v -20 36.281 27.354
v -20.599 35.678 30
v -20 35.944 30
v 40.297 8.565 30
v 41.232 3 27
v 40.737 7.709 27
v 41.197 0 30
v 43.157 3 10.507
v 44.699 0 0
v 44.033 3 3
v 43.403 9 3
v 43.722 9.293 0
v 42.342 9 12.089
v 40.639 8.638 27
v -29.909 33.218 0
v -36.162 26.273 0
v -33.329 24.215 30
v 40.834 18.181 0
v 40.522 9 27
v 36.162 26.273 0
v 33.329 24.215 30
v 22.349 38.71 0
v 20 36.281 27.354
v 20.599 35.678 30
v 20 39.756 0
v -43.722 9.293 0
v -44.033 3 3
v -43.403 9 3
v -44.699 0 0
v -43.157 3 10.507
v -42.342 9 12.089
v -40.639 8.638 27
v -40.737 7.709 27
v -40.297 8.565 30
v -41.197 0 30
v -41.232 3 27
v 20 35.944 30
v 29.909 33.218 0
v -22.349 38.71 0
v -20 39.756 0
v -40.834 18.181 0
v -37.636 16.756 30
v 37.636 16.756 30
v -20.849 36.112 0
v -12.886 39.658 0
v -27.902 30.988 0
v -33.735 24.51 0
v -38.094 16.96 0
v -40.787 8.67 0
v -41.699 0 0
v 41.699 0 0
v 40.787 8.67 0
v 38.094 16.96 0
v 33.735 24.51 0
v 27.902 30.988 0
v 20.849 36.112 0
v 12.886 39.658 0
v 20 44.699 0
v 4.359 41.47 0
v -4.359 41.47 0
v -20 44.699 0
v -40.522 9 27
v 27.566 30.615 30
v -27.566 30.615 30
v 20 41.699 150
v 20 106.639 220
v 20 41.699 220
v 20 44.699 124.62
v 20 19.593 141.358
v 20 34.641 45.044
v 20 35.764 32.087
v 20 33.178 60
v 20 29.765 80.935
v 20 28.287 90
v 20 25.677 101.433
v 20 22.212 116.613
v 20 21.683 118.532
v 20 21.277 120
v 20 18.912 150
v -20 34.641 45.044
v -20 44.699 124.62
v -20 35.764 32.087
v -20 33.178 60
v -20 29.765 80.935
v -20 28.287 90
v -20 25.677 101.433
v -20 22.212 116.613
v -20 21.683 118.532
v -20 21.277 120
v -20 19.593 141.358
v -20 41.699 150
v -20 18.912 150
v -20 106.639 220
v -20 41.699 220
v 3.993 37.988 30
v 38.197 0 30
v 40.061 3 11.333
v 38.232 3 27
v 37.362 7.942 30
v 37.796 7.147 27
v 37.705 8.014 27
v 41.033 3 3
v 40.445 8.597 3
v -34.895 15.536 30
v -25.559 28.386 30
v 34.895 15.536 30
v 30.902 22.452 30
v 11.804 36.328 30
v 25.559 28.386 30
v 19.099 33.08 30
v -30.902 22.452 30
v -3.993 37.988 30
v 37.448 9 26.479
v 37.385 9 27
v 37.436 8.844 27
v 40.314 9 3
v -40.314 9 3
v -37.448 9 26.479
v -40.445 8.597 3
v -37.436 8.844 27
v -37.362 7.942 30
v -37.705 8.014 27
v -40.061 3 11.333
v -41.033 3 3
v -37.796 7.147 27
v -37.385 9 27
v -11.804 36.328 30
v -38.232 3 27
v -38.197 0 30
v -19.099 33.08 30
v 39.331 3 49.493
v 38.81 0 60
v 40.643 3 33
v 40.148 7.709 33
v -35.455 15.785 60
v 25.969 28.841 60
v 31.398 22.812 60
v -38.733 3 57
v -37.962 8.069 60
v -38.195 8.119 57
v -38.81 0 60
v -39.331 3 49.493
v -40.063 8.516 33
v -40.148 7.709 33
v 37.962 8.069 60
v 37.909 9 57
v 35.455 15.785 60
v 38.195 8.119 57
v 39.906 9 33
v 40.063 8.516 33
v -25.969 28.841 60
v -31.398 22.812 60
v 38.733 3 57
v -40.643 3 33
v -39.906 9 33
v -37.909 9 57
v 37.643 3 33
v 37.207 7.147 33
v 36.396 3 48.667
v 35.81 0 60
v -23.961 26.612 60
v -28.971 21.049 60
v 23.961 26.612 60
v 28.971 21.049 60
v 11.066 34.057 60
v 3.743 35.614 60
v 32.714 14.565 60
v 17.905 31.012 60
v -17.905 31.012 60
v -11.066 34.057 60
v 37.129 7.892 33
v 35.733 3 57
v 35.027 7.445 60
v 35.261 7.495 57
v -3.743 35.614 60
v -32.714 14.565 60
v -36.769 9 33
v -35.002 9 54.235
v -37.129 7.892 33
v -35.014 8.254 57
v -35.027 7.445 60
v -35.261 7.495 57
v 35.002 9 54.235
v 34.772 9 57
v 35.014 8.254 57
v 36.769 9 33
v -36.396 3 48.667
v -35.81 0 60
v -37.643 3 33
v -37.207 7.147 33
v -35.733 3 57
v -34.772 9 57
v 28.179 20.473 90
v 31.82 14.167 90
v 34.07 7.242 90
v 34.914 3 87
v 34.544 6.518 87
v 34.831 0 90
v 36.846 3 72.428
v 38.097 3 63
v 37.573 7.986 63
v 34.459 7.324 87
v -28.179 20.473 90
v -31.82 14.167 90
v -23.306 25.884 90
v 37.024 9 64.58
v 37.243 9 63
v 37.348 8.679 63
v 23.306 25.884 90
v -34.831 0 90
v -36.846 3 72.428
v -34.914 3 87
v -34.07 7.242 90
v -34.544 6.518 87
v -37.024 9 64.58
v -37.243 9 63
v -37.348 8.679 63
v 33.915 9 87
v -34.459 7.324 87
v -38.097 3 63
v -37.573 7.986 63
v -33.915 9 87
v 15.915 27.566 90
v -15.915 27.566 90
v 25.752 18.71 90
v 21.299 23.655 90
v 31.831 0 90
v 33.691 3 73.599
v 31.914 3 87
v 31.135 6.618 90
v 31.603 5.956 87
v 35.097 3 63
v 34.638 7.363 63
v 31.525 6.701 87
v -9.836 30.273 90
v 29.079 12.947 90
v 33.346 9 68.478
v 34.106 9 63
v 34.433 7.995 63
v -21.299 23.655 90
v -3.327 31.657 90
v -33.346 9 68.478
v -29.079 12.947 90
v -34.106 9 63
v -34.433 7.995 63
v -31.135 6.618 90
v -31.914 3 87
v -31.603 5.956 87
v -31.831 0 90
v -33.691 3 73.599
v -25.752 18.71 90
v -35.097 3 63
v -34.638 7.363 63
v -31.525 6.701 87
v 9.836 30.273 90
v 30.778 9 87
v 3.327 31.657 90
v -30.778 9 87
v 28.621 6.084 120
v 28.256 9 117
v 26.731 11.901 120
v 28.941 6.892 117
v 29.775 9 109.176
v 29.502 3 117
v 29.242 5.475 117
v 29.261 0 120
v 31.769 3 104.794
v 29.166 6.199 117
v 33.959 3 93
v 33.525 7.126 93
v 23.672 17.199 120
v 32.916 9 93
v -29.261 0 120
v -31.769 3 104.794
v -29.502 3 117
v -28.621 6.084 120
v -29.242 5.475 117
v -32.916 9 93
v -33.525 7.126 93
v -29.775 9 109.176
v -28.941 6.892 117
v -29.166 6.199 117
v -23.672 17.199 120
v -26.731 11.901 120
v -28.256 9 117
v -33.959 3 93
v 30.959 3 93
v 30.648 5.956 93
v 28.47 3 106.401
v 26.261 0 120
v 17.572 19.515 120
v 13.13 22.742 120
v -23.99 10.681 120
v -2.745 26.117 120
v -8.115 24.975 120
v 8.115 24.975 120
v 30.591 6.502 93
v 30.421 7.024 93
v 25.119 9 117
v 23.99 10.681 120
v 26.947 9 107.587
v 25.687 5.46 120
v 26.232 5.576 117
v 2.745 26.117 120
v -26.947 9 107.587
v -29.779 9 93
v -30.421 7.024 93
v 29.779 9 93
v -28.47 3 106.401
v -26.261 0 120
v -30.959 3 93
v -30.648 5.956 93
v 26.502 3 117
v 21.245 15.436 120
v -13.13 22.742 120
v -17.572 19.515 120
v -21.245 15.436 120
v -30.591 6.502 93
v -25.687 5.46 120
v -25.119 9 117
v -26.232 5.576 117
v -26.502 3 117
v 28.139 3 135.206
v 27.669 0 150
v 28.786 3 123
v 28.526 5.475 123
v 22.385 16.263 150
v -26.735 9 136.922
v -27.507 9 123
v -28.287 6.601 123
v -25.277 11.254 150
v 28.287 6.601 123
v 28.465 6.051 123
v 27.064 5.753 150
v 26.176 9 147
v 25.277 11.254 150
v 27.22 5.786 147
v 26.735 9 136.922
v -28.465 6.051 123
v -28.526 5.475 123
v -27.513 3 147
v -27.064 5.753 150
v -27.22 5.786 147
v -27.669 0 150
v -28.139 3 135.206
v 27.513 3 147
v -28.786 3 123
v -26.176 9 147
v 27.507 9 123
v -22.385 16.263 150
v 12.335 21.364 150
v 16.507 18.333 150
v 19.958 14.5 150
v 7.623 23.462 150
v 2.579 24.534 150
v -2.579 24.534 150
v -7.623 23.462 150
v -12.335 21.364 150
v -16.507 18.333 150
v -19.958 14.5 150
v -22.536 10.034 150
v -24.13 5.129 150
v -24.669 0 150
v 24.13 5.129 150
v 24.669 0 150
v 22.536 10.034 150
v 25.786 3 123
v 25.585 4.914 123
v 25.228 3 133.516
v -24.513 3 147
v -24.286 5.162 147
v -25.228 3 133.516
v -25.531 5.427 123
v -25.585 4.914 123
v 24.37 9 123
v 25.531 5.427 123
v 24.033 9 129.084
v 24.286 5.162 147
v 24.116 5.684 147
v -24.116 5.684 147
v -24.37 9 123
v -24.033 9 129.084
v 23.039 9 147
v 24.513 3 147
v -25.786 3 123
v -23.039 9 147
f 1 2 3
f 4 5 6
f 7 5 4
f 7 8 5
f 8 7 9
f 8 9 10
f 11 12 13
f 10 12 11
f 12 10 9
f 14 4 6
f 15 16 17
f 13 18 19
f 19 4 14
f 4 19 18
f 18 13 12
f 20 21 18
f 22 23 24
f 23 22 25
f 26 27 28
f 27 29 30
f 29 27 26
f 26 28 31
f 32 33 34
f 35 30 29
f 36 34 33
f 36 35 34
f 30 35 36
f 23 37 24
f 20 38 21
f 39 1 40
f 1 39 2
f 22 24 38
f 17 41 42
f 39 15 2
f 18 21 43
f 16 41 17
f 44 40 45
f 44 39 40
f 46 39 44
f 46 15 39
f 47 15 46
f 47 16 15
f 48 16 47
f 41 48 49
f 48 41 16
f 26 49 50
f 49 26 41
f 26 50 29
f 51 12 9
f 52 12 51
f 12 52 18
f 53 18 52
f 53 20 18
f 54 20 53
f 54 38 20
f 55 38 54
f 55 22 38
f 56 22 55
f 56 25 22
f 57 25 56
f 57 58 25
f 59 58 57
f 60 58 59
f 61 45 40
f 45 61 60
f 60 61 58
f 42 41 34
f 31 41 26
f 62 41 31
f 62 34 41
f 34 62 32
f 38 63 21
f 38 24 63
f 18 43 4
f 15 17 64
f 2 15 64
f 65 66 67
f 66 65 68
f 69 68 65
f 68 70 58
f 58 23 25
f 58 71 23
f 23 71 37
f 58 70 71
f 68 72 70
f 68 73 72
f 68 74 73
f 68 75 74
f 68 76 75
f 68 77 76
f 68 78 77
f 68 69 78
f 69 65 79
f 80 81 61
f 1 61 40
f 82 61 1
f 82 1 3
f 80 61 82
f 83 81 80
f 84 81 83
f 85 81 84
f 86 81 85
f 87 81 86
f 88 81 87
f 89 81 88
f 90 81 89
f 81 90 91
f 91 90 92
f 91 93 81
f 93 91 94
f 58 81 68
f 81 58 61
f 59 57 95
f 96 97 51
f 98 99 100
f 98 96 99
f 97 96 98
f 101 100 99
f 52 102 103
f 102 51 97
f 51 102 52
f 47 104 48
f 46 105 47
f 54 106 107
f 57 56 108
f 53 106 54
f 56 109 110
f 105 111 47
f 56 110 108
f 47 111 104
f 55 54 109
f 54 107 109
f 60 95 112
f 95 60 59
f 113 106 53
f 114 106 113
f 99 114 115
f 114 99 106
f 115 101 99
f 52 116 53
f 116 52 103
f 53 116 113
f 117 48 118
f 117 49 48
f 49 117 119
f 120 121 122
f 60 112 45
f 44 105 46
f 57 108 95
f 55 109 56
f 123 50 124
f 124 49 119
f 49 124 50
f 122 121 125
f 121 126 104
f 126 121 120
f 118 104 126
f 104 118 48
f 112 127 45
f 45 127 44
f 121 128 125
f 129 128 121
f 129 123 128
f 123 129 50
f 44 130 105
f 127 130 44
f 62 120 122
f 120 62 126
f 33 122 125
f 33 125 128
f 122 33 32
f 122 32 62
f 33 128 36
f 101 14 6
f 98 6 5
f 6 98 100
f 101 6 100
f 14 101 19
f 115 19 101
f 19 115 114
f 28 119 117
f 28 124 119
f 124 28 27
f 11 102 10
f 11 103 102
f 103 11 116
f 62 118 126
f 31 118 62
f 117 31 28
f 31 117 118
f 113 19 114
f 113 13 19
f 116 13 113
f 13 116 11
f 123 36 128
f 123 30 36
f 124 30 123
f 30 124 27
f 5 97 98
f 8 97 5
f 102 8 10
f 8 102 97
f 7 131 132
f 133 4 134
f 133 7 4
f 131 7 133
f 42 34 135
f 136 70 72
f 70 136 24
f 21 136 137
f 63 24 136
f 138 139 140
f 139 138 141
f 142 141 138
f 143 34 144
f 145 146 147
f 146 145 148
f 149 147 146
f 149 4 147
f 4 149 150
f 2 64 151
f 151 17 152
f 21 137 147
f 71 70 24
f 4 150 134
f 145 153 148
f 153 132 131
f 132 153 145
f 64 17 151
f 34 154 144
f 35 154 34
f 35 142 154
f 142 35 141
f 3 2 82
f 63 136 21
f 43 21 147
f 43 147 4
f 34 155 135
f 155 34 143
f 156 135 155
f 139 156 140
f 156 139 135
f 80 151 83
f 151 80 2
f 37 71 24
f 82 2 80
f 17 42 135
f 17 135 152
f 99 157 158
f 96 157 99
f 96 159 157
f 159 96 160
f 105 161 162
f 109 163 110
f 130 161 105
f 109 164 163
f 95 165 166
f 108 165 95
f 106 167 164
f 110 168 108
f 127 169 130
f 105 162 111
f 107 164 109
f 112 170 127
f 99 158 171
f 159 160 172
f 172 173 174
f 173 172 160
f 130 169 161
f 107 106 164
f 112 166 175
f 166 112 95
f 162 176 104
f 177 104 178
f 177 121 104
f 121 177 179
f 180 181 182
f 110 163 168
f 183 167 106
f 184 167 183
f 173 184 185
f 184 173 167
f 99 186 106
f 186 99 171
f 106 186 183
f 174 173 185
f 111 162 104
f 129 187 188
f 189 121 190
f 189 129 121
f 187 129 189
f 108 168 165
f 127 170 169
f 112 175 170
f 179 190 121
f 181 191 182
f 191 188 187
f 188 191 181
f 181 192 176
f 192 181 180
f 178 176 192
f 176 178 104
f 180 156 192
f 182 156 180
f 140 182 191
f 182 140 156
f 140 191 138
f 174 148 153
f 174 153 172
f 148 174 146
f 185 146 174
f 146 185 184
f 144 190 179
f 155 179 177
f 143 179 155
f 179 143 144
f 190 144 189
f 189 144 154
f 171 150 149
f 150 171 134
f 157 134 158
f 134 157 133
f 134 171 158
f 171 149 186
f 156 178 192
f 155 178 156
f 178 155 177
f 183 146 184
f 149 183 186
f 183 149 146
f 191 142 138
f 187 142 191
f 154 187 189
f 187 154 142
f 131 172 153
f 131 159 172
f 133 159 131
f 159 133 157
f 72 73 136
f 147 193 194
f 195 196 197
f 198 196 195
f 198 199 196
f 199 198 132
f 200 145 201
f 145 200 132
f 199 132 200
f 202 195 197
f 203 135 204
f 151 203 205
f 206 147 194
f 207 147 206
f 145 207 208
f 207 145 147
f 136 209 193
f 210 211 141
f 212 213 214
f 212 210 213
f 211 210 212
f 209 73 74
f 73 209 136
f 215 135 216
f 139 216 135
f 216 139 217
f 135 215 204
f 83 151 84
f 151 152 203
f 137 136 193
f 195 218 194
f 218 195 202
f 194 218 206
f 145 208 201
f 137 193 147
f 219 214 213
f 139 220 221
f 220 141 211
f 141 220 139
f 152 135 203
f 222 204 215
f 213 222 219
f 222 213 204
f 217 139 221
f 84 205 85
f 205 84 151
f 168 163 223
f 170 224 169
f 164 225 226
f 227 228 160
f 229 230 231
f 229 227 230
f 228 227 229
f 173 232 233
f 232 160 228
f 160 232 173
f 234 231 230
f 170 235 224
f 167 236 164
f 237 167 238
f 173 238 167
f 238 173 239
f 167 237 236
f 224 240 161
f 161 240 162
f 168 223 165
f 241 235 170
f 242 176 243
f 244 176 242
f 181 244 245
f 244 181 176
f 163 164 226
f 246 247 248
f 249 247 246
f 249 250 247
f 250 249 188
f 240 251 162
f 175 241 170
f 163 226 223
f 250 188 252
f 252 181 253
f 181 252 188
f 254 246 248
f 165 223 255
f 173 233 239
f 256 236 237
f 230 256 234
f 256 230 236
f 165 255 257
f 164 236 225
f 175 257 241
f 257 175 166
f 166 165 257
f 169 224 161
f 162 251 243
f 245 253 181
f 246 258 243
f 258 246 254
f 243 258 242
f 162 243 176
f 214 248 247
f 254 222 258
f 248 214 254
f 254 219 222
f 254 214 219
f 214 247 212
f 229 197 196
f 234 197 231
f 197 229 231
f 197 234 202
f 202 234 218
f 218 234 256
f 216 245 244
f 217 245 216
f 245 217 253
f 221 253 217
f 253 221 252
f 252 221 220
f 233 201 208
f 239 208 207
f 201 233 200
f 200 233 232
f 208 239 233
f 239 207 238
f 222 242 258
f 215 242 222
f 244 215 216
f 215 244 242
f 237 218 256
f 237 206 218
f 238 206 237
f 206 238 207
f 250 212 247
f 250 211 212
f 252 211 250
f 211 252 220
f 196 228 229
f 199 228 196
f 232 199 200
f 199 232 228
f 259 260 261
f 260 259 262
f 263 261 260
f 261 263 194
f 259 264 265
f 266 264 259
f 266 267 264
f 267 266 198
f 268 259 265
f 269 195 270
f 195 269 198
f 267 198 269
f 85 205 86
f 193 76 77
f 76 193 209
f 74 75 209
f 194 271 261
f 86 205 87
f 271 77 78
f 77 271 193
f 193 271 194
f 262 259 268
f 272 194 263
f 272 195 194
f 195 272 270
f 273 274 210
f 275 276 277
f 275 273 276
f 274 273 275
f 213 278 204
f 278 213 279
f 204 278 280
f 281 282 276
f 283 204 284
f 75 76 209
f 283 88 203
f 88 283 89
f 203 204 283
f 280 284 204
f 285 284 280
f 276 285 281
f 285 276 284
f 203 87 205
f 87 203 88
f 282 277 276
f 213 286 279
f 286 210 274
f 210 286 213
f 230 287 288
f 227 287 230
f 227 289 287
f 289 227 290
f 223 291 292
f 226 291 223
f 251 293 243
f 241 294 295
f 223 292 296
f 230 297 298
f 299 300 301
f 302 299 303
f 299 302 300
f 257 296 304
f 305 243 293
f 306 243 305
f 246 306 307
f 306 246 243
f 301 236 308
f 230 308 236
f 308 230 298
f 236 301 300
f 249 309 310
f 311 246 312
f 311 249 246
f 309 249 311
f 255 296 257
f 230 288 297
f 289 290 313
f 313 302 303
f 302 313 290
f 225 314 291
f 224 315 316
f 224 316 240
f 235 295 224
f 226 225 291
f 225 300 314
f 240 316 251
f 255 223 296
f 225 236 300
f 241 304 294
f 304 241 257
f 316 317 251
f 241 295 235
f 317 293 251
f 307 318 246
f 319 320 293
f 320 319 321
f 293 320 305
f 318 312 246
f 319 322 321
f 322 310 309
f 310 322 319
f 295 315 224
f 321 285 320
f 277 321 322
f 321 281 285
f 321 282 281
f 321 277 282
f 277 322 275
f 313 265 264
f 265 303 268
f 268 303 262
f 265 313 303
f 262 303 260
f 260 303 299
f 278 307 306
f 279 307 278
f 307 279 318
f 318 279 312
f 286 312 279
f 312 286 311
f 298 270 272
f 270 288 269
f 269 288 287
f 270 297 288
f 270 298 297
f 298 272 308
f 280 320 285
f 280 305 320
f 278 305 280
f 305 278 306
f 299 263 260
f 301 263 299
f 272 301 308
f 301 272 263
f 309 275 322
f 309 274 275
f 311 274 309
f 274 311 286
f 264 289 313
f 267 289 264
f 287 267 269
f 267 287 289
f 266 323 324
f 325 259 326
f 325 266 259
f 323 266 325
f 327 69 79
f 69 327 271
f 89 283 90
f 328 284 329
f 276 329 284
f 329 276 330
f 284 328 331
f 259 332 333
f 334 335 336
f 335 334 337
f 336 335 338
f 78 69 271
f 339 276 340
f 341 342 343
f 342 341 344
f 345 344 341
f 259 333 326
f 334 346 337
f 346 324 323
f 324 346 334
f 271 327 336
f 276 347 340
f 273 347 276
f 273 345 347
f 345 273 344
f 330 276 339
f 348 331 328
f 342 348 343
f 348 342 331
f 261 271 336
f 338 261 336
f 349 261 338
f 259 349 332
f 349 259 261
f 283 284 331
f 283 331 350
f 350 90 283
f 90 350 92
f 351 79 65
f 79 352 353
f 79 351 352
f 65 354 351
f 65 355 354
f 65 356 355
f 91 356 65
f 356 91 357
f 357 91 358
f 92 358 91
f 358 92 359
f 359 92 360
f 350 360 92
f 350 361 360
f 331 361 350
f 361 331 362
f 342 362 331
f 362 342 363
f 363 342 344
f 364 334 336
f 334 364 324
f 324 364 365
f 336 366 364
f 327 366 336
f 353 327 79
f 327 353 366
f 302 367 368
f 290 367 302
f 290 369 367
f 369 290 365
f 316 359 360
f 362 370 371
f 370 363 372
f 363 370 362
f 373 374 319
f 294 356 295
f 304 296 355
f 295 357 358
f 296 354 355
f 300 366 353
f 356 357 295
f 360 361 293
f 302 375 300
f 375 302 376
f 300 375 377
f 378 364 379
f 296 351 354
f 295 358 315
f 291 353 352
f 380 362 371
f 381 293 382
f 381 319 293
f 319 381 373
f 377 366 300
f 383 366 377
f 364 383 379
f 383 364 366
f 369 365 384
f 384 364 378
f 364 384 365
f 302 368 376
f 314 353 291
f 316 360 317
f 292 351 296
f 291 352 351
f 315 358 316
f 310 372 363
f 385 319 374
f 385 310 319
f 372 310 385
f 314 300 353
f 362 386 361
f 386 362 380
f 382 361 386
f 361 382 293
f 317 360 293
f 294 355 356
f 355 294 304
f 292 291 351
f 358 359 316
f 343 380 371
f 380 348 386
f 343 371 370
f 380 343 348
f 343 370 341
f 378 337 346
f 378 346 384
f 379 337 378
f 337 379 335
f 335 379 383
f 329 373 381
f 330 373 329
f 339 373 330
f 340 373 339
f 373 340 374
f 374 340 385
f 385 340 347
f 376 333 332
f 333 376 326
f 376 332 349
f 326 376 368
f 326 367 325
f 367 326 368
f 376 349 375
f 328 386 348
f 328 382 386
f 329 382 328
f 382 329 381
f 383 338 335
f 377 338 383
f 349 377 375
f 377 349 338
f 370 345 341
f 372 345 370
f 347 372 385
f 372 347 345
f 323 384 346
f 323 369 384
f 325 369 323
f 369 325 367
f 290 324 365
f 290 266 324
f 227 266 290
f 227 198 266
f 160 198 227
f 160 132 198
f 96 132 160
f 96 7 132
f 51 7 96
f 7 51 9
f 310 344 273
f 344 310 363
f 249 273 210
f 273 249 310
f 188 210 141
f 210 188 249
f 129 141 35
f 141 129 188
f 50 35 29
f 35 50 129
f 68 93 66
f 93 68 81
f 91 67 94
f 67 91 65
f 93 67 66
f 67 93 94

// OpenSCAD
union()  {
difference()  {
union()  {
translate([0.0,0.0,0.0])difference()  {
union()  {
cylinder(r1=44.69859509007658,r2=41.197186342054884,h=30.0);
translate([-20.0,0.0,0.0])cube([40.0,44.69859509007658,30.0]);
}
cylinder(r1=41.69859509007658,r2=38.197186342054884,h=30.0);
translate([-44.69859509007658,3.0,3.0])cube([89.39719018015316,6.0,24.0]);
}
translate([0.0,0.0,30.0])difference()  {
union()  {
cylinder(r1=41.197186342054884,r2=38.80986219567645,h=30.0);
translate([-20.0,0.0,0.0])cube([40.0,44.69859509007658,30.0]);
}
cylinder(r1=38.197186342054884,r2=35.80986219567645,h=30.0);
translate([-44.69859509007658,3.0,3.0])cube([89.39719018015316,6.0,24.0]);
}
translate([0.0,0.0,60.0])difference()  {
union()  {
cylinder(r1=38.80986219567645,r2=34.83098861837907,h=30.0);
translate([-20.0,0.0,0.0])cube([40.0,44.69859509007658,30.0]);
}
cylinder(r1=35.80986219567645,r2=31.830988618379067,h=30.0);
translate([-44.69859509007658,3.0,3.0])cube([89.39719018015316,6.0,24.0]);
}
translate([0.0,0.0,90.0])difference()  {
union()  {
cylinder(r1=34.83098861837907,r2=29.26056561016273,h=30.0);
translate([-20.0,0.0,0.0])cube([40.0,44.69859509007658,30.0]);
}
cylinder(r1=31.830988618379067,r2=26.260565610162732,h=30.0);
translate([-44.69859509007658,3.0,3.0])cube([89.39719018015316,6.0,24.0]);
}
translate([0.0,0.0,120.0])difference()  {
union()  {
cylinder(r1=29.26056561016273,r2=27.669016179243776,h=30.0);
translate([-20.0,0.0,0.0])cube([40.0,44.69859509007658,30.0]);
}
cylinder(r1=26.260565610162732,r2=24.669016179243776,h=30.0);
translate([-44.69859509007658,3.0,3.0])cube([89.39719018015316,6.0,24.0]);
}
}
translate([-44.69859509007658,-44.69859509007658,0.0])cube([89.39719018015316,44.69859509007658,180.0]);
}
translate([-20.0,41.69859509007658,220.0])scale([1.0,1.0,1.0])rotate([0.0,0.0,0.0])  rotate([90.0,90.0,90.0])  linear_extrude(height =40.0)  polygon(
points = [[0.0,0.0],[100.0,0.0],[0.0,64.94075931975104]]);
}
